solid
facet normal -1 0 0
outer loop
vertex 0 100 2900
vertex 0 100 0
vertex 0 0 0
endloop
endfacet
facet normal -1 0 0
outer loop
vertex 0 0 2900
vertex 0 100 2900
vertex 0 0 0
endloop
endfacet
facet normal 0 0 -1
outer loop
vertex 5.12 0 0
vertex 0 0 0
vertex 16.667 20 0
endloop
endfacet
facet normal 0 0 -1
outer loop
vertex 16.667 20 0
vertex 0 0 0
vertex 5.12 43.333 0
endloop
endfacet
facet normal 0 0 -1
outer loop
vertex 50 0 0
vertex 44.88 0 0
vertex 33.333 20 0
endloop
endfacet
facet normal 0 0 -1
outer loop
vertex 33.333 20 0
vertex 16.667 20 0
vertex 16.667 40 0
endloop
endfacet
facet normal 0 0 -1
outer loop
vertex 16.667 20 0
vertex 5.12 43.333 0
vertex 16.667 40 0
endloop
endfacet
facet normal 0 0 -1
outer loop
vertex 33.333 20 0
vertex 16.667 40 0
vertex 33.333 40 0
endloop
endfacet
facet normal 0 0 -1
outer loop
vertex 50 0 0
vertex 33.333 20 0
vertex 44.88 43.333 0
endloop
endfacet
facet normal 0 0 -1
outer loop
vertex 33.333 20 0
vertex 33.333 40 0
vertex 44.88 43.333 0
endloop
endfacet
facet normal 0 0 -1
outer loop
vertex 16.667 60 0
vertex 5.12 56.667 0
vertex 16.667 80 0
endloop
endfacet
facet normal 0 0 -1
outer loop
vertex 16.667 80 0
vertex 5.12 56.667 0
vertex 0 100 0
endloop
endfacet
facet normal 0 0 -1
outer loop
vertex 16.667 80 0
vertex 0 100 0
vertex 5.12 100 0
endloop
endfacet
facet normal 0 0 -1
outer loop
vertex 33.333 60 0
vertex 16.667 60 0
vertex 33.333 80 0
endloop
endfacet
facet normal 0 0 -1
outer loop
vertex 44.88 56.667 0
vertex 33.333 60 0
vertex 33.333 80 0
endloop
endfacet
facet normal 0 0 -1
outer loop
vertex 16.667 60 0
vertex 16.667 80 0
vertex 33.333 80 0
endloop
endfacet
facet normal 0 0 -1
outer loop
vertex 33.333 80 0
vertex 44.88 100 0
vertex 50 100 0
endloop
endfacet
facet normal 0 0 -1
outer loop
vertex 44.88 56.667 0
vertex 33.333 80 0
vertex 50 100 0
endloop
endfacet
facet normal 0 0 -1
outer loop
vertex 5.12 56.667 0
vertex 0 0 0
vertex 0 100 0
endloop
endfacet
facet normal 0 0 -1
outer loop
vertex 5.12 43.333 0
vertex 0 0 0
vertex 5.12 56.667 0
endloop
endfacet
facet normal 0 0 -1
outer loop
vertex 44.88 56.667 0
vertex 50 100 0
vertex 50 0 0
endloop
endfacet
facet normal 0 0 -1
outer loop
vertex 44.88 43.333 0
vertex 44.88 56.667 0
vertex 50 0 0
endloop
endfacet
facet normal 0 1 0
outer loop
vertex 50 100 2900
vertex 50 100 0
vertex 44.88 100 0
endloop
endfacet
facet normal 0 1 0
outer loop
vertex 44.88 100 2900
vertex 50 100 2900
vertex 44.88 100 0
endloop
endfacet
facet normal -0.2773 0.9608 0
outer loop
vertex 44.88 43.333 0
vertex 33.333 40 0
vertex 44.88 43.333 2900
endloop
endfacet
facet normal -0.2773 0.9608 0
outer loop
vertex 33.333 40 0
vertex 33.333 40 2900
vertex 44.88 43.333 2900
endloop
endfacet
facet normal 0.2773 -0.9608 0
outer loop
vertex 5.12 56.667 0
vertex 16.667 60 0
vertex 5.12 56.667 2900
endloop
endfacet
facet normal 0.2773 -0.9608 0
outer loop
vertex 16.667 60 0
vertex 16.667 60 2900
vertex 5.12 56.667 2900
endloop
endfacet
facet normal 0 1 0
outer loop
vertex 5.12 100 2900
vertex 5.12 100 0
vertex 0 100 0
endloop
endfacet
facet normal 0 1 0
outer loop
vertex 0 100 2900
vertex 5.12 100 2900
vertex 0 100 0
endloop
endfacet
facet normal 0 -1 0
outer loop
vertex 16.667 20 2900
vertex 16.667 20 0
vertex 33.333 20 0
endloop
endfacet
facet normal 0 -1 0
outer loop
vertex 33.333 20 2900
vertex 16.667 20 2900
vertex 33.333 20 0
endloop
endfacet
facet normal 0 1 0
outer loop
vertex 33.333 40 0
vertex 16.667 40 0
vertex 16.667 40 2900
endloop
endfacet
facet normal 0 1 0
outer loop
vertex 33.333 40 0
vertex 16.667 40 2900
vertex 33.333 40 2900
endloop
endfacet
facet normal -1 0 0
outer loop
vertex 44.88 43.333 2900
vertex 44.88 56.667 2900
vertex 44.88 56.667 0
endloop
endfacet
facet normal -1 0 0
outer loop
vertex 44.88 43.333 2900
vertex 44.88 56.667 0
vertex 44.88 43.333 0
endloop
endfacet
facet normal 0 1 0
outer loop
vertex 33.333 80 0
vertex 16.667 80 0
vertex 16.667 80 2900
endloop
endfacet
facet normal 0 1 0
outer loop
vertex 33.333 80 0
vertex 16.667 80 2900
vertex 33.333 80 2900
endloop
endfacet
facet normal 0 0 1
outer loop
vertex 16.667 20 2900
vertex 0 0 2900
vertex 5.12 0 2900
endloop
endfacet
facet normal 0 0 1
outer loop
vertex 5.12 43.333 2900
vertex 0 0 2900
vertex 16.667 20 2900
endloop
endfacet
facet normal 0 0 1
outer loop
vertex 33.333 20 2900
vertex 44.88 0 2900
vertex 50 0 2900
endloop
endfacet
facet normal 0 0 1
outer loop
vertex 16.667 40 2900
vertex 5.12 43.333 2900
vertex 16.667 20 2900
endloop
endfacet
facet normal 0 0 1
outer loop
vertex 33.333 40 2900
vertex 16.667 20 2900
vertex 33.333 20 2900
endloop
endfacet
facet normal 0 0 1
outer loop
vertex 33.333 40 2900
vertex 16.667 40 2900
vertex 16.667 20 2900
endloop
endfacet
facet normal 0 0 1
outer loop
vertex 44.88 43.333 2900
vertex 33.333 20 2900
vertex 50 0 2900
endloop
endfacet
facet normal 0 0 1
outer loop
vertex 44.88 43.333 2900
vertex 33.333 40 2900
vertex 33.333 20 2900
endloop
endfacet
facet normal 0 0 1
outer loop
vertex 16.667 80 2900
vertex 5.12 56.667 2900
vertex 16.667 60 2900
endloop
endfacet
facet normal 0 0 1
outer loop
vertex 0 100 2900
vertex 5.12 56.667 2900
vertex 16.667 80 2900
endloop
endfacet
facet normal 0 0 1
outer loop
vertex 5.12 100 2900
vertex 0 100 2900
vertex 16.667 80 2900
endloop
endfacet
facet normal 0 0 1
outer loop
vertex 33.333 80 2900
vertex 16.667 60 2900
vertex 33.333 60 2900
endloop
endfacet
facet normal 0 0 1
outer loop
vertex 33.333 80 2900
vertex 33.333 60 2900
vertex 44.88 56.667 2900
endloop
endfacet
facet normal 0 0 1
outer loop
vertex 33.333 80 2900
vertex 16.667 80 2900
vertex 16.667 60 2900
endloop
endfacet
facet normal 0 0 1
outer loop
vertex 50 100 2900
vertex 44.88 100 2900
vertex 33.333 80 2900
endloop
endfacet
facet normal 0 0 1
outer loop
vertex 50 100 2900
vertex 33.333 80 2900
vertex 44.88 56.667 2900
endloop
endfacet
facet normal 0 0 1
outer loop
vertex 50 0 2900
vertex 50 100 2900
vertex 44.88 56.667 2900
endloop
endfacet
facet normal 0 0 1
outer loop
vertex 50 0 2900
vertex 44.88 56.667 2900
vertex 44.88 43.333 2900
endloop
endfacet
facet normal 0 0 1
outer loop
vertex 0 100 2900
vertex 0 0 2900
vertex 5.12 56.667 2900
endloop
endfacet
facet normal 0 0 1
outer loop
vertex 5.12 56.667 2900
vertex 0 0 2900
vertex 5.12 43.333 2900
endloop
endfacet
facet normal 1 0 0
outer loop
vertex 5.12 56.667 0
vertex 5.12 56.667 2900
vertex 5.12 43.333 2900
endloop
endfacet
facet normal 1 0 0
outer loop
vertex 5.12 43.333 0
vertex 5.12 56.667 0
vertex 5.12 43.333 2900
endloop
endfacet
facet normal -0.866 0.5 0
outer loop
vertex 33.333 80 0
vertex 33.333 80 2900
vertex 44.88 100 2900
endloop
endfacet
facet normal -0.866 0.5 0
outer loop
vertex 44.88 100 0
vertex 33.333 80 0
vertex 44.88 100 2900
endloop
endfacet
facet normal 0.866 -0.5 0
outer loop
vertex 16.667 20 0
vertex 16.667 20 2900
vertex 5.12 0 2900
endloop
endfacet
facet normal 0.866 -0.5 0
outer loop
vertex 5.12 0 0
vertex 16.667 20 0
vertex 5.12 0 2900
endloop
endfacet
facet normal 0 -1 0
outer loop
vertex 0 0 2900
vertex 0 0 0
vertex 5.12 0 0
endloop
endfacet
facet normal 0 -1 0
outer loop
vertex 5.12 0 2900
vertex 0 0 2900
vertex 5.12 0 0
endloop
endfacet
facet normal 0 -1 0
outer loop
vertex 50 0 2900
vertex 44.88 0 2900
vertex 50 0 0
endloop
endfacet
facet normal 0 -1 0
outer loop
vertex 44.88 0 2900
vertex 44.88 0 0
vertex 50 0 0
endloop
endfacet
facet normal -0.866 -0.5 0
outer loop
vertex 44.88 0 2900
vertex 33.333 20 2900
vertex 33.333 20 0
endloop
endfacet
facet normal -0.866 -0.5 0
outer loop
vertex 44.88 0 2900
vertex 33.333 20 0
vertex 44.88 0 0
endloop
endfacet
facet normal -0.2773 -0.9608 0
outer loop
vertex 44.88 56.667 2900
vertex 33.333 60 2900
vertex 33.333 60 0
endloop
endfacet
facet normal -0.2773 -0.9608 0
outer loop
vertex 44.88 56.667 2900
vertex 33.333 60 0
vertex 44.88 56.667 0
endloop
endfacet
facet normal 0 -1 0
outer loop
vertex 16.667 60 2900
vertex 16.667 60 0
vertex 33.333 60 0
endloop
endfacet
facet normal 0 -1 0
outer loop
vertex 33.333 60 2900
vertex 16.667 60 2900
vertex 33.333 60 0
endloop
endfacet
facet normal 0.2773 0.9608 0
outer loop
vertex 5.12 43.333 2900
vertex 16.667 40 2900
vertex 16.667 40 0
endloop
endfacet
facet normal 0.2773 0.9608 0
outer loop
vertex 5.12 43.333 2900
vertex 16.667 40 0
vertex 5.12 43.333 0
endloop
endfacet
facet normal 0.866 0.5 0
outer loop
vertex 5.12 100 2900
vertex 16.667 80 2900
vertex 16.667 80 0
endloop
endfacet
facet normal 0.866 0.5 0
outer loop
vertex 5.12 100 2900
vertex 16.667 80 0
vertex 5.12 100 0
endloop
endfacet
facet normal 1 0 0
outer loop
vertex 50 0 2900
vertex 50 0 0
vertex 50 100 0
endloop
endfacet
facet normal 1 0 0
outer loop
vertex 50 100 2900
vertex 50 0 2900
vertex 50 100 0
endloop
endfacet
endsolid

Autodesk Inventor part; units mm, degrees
ref_plane "YZ Plane" through (0, 0, 0) normal (1, 0, 0) x (0, 1, 0)
ref_plane "XZ Plane" through (0, 0, 0) normal (0, 1, 0) x (-1, 0, 0)
ref_plane "XY Plane" through (0, 0, 0) normal (0, 0, 1) x (1, 0, 0)
sketch "Sketch1" plane through (0, 0, 0) normal (0, 0, 1) x (1, 0, 0)
  line L0 (0, 0) -> (50, 0)
  line L1 (50, 0) -> (50, 100)
  line L2 (50, 100) -> (0, 100)
  line L3 (0, 100) -> (0, 0)
  dimension "d0" = 50
  dimension "d1" = 100
extrude "Extrusion1" add sketch "Sketch1" along normal blind 2900
sketch "Sketch2" plane through (0, 0, 2900) normal (0, 0, 1) x (1, 0, 0)
  line L0 (0, 0) -> (50, 0) projected
  line L1 (50, 0) -> (50, 100) projected
  line L2 (50, 100) -> (0, 100) projected
  line L3 (0, 100) -> (0, 0) projected
  line L4 (16.6667, 80) -> (33.3333, 80)
  line L5 (16.6667, 80) -> (43.3333, 80) construction
  line L6 (16.6667, 80) -> (5.1197, 100)
  line L7 (50, 100) -> (0, 100) projected
  line L8 (16.6667, 80) -> (39.7607, 80) construction
  line L9 (33.3333, 80) -> (44.8803, 100)
  line L10 (33.3333, 80) -> (56.4273, 80) construction
  line L11 (44.8803, 100) -> (5.1197, 100)
  line L12 (0, 50) -> (50, 50)
  line L13 (50, 0) -> (50, 100) projected
  line L14 (16.6667, 20) -> (33.3333, 20)
  line L15 (16.6667, 20) -> (5.1197, 0)
  line L16 (33.3333, 20) -> (44.8803, 0)
  line L17 (44.8803, 0) -> (5.1197, 0)
  dimension "d4" = 50
  dimension "d5" = 16.6667
  dimension "d6" = 100
  dimension "d7" = 20
  dimension "d8" = 16.6667
  dimension "d11" = 120
  dimension "d12" = 60
  dimension "d13" = 50
extrude "Extrusion2" cut sketch "Sketch2" against normal up to next contours L15 L14 L16 L0 | L2 L9 L4 L6
sketch "Sketch3" plane through (0, 0, 2900) normal (0, 0, 1) x (1, 0, 0)
  line L0 (33.3333, 80) -> (16.6667, 80) projected
  line L1 (16.6667, 60) -> (33.3333, 60)
  line L2 (0, 100) -> (0, 0) projected
  line L3 (16.6667, 20) -> (33.3333, 20) projected
  line L4 (50, 100) -> (44.8803, 100) projected
  line L5 (16.6667, 40) -> (33.3333, 40)
  line L6 (5.1197, 56.6667) -> (5.1197, 43.3333)
  line L7 (25, 80) -> (25, 20)
  line L8 (16.6667, 60) -> (5.1197, 56.6667)
  line L9 (16.6667, 40) -> (5.1197, 43.3333)
  line L10 (44.8803, 56.6667) -> (44.8803, 43.3333)
  line L11 (33.3333, 60) -> (44.8803, 56.6667)
  line L12 (33.3333, 40) -> (44.8803, 43.3333)
  dimension "d16" = 16.6667
  dimension "d17" = 16.6667
  dimension "d18" = 16.6667
  dimension "d19" = 16.6667
  dimension "d20" = 20
  dimension "d21" = 20
  dimension "d22" = 100
  dimension "d23" = 16.6667
  dimension "d25" = 40
  dimension "d26" = 16.6667
  dimension "d27" = 13.3333
  dimension "d28" = 3.3333
extrude "Extrusion3" cut sketch "Sketch3" against normal blind 2900
equation "\"d1\" = 2 * d0"
equation "\"d5\" = 0.333333 * d4"
equation "\"d7\" = 0.2 * d6"
equation "\"d8\" = -0.5 * d5 + 0.5 * d4"
equation "\"d13\" = 0.5 * d6"
equation "\"d17\" = d16"
equation "\"d19\" = d18"
equation "\"d21\" = 0.5 * d22 - 1.5 * d20"
equation "\"d23\" = d24"
equation "\"d25\" = -0.5 * d20 + 0.5 * d22"
equation "\"d26\" = d16"
equation "\"d27\" = 0.666667 * d21"
equation "\"d28\" = -0.5 * d27 + 0.5 * d21"
equation "\"d24\" = 16.666667"
properties part number "wheelRoad"
